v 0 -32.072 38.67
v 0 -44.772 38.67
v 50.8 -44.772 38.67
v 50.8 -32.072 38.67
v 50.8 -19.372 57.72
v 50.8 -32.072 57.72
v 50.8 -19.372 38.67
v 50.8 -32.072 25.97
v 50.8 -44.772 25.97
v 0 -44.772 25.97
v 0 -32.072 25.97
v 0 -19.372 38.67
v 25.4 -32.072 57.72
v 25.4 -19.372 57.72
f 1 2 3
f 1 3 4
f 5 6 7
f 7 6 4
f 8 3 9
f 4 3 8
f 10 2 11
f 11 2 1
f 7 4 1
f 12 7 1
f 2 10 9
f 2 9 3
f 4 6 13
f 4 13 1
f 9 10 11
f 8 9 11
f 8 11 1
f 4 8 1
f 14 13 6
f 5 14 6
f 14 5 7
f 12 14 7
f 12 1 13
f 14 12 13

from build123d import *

# Parameters (mm, degrees)
F0_W     = 12.7
F0_H     = 12.7
F1_DEPTH = 50.8
F3_DEPTH = 12.7


with BuildPart() as f1:
    # F0 (on Right) → F1 (new body)
    with BuildSketch(Plane.YZ):
        with Locations((-38.422384, 32.319873)):
            Rectangle(F0_W, F0_H)
    extrude(amount=F1_DEPTH)


with BuildPart() as f3:
    # F2 (on face) → F3 (new body)
    with BuildSketch(Plane(origin=(0, -32.072384, 0), x_dir=(-1, 0, 0), z_dir=(0, 1, 0))):
        Polygon((-50.8, 57.719873), (-50.8, 38.669873), (0, 38.669873), (-25.4, 57.719873), align=None)
    extrude(amount=F3_DEPTH)


solid = Compound([f1.part, f3.part])
